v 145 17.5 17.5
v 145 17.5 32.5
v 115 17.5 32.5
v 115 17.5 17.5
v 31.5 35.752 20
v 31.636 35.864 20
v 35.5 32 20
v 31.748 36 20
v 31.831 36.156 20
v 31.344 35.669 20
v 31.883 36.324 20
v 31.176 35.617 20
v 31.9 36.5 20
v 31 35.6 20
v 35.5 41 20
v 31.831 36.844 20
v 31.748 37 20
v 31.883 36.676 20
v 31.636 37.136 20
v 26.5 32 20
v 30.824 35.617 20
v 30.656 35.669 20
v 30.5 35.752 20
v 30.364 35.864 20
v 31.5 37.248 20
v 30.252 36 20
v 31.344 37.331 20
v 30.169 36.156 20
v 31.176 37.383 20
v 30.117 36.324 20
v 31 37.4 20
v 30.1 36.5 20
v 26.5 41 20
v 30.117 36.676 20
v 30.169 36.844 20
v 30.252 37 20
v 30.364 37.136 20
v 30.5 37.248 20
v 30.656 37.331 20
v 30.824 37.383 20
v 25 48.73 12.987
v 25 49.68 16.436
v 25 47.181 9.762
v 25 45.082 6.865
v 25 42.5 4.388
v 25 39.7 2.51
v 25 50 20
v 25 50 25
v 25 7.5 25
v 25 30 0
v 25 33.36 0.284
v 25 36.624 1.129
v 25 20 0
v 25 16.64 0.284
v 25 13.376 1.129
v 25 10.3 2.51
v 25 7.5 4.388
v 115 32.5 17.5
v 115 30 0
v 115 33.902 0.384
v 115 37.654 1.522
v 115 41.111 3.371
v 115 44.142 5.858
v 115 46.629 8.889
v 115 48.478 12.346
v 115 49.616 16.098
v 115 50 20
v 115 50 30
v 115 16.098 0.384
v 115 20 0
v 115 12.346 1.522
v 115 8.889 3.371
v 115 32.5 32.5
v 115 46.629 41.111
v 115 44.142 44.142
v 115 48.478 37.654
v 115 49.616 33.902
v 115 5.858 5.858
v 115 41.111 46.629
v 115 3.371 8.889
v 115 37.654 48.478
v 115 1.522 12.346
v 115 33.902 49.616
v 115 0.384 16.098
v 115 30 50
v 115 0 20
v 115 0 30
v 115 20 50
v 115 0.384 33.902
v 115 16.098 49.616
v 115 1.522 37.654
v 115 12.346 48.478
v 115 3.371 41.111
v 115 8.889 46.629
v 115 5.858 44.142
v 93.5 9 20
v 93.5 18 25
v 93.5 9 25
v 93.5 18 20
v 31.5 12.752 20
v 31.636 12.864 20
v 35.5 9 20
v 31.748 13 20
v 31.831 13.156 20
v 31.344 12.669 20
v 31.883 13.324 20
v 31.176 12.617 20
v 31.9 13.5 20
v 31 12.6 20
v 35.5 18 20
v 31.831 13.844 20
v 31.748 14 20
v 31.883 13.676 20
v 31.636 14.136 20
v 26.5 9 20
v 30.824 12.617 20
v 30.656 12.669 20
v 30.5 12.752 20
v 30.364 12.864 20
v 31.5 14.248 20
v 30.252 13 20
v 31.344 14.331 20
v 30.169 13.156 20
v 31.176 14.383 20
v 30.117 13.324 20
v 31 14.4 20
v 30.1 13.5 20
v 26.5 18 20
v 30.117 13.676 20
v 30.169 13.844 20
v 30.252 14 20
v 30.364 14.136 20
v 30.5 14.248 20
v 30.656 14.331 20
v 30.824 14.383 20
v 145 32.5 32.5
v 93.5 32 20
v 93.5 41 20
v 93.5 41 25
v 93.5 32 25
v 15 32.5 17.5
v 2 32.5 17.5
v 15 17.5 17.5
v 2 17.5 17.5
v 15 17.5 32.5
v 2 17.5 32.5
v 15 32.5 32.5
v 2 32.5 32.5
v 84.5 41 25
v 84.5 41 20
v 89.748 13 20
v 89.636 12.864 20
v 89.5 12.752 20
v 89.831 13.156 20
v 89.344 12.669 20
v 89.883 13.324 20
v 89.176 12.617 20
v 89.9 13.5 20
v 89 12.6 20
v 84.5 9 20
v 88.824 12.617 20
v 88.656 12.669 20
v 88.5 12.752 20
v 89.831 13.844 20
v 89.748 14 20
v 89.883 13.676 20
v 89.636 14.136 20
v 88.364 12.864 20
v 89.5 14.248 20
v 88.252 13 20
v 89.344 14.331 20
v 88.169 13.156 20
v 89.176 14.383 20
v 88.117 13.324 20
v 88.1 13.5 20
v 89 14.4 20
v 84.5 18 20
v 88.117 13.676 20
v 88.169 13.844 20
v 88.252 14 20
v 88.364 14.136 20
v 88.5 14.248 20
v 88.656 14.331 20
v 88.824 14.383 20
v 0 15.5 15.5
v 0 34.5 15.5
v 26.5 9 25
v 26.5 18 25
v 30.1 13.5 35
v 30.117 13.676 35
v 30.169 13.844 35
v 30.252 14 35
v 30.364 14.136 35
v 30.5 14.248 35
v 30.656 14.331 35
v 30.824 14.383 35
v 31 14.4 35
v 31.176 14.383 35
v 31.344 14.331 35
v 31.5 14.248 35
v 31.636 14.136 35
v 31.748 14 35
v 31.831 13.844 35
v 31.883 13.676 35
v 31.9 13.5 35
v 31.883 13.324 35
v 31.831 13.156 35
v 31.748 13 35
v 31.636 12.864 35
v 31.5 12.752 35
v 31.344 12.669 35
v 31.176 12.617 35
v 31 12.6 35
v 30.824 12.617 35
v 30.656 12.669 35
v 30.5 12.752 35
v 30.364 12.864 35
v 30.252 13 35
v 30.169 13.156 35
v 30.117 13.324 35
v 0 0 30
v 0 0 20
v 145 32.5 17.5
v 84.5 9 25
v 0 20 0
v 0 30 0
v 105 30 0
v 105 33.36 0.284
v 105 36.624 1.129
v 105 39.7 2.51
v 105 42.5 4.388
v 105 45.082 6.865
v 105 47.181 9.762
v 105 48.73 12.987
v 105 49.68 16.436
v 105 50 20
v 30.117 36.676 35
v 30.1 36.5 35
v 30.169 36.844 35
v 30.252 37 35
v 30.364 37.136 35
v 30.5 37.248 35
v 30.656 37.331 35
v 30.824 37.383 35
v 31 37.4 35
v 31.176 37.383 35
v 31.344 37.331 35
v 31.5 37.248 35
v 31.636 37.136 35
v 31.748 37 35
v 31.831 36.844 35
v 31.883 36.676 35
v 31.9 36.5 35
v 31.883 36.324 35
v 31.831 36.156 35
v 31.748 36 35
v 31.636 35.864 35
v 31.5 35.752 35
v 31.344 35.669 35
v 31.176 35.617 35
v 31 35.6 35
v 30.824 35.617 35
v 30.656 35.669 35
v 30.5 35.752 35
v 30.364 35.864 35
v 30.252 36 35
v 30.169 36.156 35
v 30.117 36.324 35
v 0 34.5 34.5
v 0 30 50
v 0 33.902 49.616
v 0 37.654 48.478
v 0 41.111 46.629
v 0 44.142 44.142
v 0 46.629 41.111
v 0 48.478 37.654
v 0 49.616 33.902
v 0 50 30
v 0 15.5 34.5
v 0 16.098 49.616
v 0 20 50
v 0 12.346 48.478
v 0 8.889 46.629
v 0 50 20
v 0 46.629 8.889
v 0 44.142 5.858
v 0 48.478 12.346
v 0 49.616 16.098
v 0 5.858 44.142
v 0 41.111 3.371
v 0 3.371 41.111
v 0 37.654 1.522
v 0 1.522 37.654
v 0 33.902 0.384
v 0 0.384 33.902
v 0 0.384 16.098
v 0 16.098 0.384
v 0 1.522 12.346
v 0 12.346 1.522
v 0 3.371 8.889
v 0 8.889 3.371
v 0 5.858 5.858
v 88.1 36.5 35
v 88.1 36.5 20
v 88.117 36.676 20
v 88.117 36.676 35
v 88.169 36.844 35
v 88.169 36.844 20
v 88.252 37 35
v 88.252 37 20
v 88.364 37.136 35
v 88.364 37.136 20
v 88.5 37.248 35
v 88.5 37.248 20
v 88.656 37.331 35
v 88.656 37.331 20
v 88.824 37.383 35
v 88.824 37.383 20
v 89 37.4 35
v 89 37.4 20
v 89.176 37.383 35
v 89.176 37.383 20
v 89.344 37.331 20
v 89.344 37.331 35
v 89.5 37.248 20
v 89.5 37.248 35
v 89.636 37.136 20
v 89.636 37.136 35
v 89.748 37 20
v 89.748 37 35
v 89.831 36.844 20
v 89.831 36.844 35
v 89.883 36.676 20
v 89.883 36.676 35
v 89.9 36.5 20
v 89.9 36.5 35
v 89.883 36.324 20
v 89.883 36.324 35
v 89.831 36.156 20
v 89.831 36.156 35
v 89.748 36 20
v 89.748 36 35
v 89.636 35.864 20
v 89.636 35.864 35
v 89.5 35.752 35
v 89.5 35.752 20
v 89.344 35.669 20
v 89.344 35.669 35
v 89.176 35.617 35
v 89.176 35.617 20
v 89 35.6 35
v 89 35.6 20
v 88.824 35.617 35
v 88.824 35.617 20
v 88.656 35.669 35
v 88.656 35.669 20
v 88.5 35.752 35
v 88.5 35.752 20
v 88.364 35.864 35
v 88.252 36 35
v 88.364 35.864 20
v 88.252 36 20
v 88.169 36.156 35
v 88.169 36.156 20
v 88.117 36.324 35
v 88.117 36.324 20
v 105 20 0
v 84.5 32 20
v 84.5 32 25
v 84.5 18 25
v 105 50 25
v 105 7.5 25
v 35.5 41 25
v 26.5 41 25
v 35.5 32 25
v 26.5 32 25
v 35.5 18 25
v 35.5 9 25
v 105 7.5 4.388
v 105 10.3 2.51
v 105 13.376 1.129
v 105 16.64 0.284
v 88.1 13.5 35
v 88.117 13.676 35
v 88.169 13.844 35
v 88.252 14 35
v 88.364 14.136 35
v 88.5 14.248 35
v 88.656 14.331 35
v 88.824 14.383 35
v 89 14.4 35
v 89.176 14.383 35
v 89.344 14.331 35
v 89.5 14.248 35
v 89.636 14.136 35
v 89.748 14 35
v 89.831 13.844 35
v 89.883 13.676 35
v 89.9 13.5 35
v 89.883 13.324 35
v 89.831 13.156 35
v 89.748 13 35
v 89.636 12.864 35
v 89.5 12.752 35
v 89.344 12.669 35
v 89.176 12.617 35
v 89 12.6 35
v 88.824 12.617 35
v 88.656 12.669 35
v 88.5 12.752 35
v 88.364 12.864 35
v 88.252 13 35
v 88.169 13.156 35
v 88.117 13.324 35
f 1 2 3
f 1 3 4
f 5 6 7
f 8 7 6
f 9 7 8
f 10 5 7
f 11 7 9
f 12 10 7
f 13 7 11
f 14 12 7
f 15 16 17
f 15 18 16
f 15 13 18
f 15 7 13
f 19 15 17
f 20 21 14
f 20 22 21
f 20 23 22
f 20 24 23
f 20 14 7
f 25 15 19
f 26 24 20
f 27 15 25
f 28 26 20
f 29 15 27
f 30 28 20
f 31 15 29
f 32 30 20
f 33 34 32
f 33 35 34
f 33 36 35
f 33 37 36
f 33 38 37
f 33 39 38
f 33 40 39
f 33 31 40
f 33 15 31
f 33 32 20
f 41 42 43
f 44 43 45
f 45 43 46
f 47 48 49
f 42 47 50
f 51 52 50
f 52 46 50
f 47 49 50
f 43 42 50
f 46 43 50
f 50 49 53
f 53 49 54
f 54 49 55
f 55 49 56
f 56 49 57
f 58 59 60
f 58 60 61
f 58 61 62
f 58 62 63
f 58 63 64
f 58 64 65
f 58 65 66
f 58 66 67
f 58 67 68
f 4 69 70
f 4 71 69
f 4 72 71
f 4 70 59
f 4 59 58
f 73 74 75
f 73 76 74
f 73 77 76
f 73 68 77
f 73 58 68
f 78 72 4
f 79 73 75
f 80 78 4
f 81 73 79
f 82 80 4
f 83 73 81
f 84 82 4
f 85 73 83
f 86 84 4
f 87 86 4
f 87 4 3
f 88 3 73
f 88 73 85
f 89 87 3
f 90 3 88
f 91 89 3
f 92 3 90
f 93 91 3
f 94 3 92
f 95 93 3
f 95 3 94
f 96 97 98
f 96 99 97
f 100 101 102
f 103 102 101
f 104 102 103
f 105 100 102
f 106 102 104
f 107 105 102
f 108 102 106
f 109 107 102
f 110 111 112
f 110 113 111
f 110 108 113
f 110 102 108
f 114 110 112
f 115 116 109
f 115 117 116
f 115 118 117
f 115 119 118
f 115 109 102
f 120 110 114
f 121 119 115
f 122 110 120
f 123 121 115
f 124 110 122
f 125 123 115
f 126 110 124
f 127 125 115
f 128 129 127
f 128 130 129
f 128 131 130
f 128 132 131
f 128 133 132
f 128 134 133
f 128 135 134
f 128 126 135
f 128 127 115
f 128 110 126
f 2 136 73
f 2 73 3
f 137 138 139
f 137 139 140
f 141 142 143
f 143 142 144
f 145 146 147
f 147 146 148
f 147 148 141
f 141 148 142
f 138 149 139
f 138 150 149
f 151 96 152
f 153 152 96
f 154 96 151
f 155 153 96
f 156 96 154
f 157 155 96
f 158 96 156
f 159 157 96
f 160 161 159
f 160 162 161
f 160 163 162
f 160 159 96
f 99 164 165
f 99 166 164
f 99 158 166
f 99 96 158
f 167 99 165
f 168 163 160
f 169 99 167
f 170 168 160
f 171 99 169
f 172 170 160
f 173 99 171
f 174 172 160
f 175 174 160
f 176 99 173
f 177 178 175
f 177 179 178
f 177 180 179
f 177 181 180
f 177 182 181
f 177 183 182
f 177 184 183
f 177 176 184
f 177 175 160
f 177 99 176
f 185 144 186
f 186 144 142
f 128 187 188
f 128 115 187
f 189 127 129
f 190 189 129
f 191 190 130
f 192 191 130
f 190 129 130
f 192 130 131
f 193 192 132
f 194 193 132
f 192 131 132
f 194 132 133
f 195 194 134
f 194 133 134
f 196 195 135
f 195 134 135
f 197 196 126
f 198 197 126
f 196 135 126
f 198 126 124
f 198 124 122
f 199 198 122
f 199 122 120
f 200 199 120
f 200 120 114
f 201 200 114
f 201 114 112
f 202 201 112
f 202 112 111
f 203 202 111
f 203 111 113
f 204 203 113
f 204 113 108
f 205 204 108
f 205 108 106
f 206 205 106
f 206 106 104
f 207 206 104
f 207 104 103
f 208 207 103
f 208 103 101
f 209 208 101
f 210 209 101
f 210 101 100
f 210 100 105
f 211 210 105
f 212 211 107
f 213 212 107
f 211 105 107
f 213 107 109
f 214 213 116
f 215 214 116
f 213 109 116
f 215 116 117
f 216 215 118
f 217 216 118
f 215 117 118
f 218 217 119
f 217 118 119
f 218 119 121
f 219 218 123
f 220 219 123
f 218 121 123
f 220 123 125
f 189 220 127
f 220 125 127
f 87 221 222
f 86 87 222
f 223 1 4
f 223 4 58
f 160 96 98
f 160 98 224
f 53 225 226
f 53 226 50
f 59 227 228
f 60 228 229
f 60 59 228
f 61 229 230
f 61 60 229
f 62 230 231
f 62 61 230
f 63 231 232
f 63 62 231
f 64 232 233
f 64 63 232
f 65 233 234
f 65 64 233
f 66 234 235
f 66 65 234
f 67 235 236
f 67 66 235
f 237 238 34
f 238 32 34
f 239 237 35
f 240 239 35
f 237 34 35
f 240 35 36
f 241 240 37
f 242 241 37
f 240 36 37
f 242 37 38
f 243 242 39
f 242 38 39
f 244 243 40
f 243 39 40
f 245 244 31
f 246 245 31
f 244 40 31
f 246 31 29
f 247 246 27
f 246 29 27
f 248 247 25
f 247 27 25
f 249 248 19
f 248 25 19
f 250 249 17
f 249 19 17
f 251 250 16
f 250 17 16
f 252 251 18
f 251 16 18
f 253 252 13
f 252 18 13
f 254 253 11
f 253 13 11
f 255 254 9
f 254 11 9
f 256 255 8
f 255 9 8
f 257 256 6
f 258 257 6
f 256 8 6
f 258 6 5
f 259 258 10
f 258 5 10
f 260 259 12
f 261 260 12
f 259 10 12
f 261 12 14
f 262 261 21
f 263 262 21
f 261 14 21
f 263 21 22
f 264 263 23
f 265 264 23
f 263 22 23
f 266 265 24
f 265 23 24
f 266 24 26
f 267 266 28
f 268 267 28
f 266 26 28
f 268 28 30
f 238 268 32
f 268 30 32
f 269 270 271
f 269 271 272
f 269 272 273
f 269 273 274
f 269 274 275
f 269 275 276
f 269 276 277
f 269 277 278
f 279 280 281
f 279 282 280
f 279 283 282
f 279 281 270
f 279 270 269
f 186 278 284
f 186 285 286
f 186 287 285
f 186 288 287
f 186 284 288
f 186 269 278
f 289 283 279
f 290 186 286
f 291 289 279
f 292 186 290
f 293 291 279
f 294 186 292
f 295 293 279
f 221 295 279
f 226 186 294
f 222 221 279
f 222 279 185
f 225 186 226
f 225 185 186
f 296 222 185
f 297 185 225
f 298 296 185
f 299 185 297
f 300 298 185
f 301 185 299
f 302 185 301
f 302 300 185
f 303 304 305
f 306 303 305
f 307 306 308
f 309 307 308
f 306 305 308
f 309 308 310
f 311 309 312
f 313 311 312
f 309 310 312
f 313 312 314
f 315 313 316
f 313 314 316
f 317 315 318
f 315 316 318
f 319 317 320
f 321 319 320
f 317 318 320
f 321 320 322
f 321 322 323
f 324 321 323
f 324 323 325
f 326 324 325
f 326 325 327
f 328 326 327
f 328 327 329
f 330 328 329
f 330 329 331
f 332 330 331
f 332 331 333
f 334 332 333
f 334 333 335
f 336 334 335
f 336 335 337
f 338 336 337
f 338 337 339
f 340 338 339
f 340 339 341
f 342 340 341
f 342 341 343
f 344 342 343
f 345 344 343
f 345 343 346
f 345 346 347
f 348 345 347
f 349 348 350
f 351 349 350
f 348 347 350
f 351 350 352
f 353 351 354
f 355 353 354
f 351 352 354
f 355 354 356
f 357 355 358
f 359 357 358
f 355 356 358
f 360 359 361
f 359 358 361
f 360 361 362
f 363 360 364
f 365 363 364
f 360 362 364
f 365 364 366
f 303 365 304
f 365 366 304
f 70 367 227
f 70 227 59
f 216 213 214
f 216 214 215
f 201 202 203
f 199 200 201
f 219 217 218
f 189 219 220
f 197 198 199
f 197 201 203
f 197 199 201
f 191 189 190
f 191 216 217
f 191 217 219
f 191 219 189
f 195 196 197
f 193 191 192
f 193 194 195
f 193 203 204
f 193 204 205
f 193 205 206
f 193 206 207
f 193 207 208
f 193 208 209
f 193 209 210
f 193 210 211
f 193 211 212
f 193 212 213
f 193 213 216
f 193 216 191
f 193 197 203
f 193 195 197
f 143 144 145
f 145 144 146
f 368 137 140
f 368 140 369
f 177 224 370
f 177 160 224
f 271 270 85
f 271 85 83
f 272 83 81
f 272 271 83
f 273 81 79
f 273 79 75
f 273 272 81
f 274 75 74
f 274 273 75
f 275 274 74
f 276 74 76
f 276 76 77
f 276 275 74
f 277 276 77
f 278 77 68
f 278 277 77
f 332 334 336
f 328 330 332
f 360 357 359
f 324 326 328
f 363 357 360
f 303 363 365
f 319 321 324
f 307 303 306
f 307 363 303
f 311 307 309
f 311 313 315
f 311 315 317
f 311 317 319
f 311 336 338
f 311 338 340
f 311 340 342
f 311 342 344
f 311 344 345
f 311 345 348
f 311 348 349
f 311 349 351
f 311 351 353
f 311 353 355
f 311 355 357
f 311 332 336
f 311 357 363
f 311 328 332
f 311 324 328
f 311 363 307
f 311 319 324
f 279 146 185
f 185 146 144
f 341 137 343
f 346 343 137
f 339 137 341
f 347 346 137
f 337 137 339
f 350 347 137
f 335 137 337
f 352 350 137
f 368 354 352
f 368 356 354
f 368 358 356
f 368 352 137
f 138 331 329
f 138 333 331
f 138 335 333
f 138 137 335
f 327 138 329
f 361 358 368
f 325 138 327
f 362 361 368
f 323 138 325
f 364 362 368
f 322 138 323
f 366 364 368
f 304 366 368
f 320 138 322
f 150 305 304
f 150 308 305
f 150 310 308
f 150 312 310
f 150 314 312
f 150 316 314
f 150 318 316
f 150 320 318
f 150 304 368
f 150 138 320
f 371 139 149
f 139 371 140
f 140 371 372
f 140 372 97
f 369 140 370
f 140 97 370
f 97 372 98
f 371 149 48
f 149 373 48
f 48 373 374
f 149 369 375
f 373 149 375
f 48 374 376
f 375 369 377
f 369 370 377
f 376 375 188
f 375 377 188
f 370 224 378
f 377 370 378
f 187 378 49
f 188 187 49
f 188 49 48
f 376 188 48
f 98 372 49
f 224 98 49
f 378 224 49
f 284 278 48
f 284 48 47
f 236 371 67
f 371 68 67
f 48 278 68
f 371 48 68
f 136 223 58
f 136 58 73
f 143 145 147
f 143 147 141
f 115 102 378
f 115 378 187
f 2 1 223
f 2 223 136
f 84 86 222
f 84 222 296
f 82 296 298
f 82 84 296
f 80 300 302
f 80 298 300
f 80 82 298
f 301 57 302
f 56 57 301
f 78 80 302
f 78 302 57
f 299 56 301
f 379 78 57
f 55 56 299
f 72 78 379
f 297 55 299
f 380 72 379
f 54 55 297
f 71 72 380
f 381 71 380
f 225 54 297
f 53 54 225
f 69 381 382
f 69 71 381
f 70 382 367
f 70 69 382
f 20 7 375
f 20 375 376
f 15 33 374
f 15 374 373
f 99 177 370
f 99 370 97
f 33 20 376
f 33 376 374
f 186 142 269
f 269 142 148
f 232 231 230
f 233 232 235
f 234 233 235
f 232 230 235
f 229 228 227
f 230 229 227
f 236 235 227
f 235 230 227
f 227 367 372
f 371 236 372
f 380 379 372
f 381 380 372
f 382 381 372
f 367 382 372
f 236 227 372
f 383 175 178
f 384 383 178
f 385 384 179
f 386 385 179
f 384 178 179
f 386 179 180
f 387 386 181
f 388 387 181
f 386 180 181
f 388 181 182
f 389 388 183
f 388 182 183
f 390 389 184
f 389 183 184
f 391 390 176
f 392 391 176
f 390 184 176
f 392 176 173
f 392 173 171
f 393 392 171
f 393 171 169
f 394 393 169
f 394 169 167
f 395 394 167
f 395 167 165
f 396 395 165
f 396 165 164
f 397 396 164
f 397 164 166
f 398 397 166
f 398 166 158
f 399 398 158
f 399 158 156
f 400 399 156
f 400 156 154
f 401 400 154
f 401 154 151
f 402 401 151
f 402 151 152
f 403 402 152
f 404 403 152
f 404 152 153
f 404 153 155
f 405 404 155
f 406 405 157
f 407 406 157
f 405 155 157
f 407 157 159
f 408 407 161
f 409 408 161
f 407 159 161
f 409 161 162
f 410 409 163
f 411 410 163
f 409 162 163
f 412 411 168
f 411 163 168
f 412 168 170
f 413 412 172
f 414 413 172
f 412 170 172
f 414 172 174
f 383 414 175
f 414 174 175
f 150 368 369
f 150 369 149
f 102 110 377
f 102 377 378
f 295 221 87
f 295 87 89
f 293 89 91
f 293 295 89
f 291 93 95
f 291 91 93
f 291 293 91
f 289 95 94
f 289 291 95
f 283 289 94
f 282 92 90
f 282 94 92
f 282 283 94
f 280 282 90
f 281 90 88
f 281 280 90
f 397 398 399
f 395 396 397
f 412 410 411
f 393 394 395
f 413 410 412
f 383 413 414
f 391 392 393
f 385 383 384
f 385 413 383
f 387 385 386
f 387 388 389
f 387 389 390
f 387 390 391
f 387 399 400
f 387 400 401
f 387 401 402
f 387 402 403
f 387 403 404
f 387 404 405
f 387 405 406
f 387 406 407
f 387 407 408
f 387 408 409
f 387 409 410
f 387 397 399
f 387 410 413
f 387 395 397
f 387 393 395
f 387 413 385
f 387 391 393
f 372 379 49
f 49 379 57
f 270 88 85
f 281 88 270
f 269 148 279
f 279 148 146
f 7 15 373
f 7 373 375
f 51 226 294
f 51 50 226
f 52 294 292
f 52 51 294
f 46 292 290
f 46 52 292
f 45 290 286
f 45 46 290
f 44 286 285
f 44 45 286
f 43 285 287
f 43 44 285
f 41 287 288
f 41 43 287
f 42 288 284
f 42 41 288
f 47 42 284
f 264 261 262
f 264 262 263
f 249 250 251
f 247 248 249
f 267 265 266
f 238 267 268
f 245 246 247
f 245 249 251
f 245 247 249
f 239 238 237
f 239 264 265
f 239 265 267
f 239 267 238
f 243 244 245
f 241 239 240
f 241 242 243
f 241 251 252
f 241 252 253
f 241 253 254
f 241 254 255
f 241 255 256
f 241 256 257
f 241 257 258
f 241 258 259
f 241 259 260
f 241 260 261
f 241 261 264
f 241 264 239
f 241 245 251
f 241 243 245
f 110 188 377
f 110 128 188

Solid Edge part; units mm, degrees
sketch "Sketch1" plane through (0, 0, 0) normal (0, -1, 0) x (1, 0, 0)
  line L0 (0, 0) -> (115, 0)
  line L1 (115, 0) -> (115, 50)
  line L2 (115, 50) -> (0, 50)
  line L3 (0, 50) -> (0, 0)
  dimension "D1" = 50
  dimension "D2" = 50
  dimension "D3" = 115
extrude "Protrusion1" add sketch "Sketch1" against normal blind 50
fillet "Verrundung_2" radius 20 4 edges at (57.5, 50, 50) (57.5, 50, 0) (57.5, 0, 50) (57.5, 0, 0)
sketch "Sketch2" plane through (0, 25, 25) normal (-1, 0, 0) x (0, 0, -1)
  line L0 (-7.5, -7.5) -> (7.5, -7.5)
  line L1 (7.5, -7.5) -> (7.5, 7.5)
  line L2 (7.5, 7.5) -> (-7.5, 7.5)
  line L3 (-7.5, 7.5) -> (-7.5, -7.5)
  dimension "D1" = 15
extrude "Extrusionsausschnitt_5" cut sketch "Sketch2" against normal blind 15
chamfer "Fase_3" distance 2 angle 45 4 edges at (0, 25, 32.5) (0, 17.5, 25) (0, 25, 17.5) (0, 32.5, 25)
sketch "Sketch3" plane through (115, 25, 25) normal (1, 0, 0) x (0, 1, 0)
  line L0 (-7.5, -7.5) -> (7.5, -7.5)
  line L1 (7.5, -7.5) -> (7.5, 7.5)
  line L2 (7.5, 7.5) -> (-7.5, 7.5)
  line L3 (-7.5, 7.5) -> (-7.5, -7.5)
  dimension "D1" = 15
extrude "Extrusionsausprägung_2" add sketch "Sketch3" along normal blind 30
sketch "Sketch4" plane through (57.5, 25, 0) normal (0, 0, -1) x (-1, 0, 0)
  line L0 (-47.5, -17.5) -> (32.5, -17.5)
  line L1 (32.5, -17.5) -> (32.5, 17.5)
  line L2 (32.5, 17.5) -> (-47.5, 17.5)
  line L3 (-47.5, 17.5) -> (-47.5, -17.5)
  dimension "D1" = 35
  dimension "D2" = 80
  dimension "D3" = 10
extrude "Extrusionsausschnitt_6" cut sketch "Sketch4" against normal blind 20
sketch "Sketch5" plane through (65, 25, 20) normal (0, 0, -1) x (-1, 0, 0)
  circle A0 centre (-24, 11.5) radius 0.9
  circle A1 centre (-24, -11.5) radius 0.9
  circle A2 centre (34, -11.5) radius 0.9
  circle A3 centre (34, 11.5) radius 0.9
  dimension "D1" = 58
  dimension "D2" = 23
  dimension "D3" = 6
  dimension "D4" = 1.8
extrude "Extrusionsausschnitt_7" cut sketch "Sketch5" against normal blind 15
sketch "Sketch6" plane through (65, 25, 20) normal (0, 0, -1) x (-1, 0, 0)
  line L0 (-40, 17.5) -> (40, 17.5)
  line L1 (40, 17.5) -> (40, -17.5)
  line L2 (40, -17.5) -> (-40, -17.5)
  line L3 (-40, -17.5) -> (-40, 17.5)
  line L4 (-28.5, 7) -> (-19.5, 7)
  line L5 (-19.5, 7) -> (-19.5, 16)
  line L6 (-19.5, 16) -> (-28.5, 16)
  line L7 (-28.5, 16) -> (-28.5, 7)
  line L8 (-28.5, -16) -> (-19.5, -16)
  line L9 (-19.5, -16) -> (-19.5, -7)
  line L10 (-19.5, -7) -> (-28.5, -7)
  line L11 (-28.5, -7) -> (-28.5, -16)
  line L12 (29.5, 7) -> (38.5, 7)
  line L13 (38.5, 7) -> (38.5, 16)
  line L14 (38.5, 16) -> (29.5, 16)
  line L15 (29.5, 16) -> (29.5, 7)
  line L16 (29.5, -16) -> (38.5, -16)
  line L17 (38.5, -16) -> (38.5, -7)
  line L18 (38.5, -7) -> (29.5, -7)
  line L19 (29.5, -7) -> (29.5, -16)
  dimension "D1" = 9
extrude "Extrusionsausschnitt_8" cut sketch "Sketch6" against normal blind 5
sketch "Sketch7" plane through (65, 42.5, 14.6938) normal (0, -1, 0) x (-1, 0, 0)
  line L0 (-40, -10.3062) -> (40, -10.3062)
  line L1 (40, -10.3062) -> (40, 10.3062)
  line L2 (40, 10.3062) -> (-40, 10.3062)
  line L3 (-40, 10.3062) -> (-40, -10.3062)
extrude "Extrusionsausschnitt_9" cut sketch "Sketch7" against normal blind 12
properties material "Nylon, allgemein"
